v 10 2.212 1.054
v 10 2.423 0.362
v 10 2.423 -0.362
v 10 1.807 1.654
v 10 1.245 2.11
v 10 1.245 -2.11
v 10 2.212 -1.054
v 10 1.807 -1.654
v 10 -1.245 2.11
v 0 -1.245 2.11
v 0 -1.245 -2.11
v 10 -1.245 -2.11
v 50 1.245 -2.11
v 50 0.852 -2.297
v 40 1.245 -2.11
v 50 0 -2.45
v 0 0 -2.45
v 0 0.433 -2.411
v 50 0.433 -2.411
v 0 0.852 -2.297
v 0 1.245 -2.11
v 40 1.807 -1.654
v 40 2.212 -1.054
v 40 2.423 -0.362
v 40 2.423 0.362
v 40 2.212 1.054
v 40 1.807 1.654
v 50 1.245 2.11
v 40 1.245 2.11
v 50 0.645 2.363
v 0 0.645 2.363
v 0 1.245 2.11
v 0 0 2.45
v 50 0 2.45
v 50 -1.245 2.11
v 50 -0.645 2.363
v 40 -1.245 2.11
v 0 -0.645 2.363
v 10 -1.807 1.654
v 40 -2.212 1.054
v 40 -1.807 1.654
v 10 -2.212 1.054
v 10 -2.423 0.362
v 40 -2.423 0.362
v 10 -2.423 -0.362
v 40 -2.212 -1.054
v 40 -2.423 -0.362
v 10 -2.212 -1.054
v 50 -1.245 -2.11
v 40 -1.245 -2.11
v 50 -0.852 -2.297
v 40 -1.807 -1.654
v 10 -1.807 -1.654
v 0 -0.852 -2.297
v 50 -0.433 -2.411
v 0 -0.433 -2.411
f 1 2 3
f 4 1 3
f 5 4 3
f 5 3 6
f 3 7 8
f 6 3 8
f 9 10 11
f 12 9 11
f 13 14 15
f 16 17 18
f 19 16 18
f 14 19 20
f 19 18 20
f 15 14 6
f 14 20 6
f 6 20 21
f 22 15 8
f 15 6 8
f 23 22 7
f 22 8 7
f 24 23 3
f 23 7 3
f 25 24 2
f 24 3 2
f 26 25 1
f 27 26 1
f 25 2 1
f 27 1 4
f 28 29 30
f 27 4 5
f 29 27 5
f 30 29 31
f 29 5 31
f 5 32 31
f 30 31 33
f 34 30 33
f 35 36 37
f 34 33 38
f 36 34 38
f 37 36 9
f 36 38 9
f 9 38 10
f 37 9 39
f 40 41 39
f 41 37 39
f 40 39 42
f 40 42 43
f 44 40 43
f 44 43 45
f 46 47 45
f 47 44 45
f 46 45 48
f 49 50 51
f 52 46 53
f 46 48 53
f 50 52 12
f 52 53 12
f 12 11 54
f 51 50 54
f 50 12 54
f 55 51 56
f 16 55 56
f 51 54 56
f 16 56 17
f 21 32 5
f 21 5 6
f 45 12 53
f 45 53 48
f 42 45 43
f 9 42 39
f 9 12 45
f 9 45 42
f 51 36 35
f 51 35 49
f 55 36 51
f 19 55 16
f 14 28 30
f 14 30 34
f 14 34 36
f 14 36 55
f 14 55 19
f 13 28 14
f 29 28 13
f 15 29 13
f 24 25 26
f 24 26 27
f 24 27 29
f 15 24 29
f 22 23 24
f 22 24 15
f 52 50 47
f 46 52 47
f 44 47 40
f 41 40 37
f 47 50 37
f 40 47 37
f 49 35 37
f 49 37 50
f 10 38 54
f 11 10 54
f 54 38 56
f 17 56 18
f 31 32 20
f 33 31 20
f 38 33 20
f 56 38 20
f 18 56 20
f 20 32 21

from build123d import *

# Parameters (mm, degrees)
SKETCH1_R           = 2.45
BOSS_EXTRUDE1_DEPTH = 50
CUT_EXTRUDE1_DEPTH  = 10
CUT_EXTRUDE2_START  = -50
CUT_EXTRUDE2_DEPTH  = 10


with BuildPart() as part:
    # Sketch1 → Boss-Extrude1 (new body)
    with BuildSketch(Plane(origin=(0, 0, 0), x_dir=(0, 0, -1), z_dir=(1, 0, 0))):
        Circle(SKETCH1_R)
    extrude(amount=BOSS_EXTRUDE1_DEPTH)

    # Sketch2 → Cut-Extrude1 (cut)
    with BuildSketch(Plane(origin=(50, 0, 0), x_dir=(0, 0, -1), z_dir=(1, 0, 0))):
        with BuildLine():
            Line((-2.110088861, 1.245), (2.110088861, 1.245))
            ThreePointArc((2.110088861, 1.245), (0, 2.45), (-2.110088861, 1.245))
        make_face()
        with BuildLine():
            Line((-2.110088861, -1.245), (2.110088861, -1.245))
            ThreePointArc((2.110088861, -1.245), (0, -2.45), (-2.110088861, -1.245))
        make_face()
    extrude(amount=-CUT_EXTRUDE1_DEPTH, mode=Mode.SUBTRACT)

    # Sketch2<2> → Cut-Extrude2 (cut)
    with BuildSketch(Plane(origin=(50, 0, 0), x_dir=(0, 0, -1), z_dir=(1, 0, 0)).offset(CUT_EXTRUDE2_START)):
        with BuildLine():
            Line((-2.110088861, 1.245), (2.110088861, 1.245))
            ThreePointArc((2.110088861, 1.245), (0, 2.45), (-2.110088861, 1.245))
        make_face()
        with BuildLine():
            Line((-2.110088861, -1.245), (2.110088861, -1.245))
            ThreePointArc((2.110088861, -1.245), (0, -2.45), (-2.110088861, -1.245))
        make_face()
    extrude(amount=CUT_EXTRUDE2_DEPTH, mode=Mode.SUBTRACT)


solid = part.part
